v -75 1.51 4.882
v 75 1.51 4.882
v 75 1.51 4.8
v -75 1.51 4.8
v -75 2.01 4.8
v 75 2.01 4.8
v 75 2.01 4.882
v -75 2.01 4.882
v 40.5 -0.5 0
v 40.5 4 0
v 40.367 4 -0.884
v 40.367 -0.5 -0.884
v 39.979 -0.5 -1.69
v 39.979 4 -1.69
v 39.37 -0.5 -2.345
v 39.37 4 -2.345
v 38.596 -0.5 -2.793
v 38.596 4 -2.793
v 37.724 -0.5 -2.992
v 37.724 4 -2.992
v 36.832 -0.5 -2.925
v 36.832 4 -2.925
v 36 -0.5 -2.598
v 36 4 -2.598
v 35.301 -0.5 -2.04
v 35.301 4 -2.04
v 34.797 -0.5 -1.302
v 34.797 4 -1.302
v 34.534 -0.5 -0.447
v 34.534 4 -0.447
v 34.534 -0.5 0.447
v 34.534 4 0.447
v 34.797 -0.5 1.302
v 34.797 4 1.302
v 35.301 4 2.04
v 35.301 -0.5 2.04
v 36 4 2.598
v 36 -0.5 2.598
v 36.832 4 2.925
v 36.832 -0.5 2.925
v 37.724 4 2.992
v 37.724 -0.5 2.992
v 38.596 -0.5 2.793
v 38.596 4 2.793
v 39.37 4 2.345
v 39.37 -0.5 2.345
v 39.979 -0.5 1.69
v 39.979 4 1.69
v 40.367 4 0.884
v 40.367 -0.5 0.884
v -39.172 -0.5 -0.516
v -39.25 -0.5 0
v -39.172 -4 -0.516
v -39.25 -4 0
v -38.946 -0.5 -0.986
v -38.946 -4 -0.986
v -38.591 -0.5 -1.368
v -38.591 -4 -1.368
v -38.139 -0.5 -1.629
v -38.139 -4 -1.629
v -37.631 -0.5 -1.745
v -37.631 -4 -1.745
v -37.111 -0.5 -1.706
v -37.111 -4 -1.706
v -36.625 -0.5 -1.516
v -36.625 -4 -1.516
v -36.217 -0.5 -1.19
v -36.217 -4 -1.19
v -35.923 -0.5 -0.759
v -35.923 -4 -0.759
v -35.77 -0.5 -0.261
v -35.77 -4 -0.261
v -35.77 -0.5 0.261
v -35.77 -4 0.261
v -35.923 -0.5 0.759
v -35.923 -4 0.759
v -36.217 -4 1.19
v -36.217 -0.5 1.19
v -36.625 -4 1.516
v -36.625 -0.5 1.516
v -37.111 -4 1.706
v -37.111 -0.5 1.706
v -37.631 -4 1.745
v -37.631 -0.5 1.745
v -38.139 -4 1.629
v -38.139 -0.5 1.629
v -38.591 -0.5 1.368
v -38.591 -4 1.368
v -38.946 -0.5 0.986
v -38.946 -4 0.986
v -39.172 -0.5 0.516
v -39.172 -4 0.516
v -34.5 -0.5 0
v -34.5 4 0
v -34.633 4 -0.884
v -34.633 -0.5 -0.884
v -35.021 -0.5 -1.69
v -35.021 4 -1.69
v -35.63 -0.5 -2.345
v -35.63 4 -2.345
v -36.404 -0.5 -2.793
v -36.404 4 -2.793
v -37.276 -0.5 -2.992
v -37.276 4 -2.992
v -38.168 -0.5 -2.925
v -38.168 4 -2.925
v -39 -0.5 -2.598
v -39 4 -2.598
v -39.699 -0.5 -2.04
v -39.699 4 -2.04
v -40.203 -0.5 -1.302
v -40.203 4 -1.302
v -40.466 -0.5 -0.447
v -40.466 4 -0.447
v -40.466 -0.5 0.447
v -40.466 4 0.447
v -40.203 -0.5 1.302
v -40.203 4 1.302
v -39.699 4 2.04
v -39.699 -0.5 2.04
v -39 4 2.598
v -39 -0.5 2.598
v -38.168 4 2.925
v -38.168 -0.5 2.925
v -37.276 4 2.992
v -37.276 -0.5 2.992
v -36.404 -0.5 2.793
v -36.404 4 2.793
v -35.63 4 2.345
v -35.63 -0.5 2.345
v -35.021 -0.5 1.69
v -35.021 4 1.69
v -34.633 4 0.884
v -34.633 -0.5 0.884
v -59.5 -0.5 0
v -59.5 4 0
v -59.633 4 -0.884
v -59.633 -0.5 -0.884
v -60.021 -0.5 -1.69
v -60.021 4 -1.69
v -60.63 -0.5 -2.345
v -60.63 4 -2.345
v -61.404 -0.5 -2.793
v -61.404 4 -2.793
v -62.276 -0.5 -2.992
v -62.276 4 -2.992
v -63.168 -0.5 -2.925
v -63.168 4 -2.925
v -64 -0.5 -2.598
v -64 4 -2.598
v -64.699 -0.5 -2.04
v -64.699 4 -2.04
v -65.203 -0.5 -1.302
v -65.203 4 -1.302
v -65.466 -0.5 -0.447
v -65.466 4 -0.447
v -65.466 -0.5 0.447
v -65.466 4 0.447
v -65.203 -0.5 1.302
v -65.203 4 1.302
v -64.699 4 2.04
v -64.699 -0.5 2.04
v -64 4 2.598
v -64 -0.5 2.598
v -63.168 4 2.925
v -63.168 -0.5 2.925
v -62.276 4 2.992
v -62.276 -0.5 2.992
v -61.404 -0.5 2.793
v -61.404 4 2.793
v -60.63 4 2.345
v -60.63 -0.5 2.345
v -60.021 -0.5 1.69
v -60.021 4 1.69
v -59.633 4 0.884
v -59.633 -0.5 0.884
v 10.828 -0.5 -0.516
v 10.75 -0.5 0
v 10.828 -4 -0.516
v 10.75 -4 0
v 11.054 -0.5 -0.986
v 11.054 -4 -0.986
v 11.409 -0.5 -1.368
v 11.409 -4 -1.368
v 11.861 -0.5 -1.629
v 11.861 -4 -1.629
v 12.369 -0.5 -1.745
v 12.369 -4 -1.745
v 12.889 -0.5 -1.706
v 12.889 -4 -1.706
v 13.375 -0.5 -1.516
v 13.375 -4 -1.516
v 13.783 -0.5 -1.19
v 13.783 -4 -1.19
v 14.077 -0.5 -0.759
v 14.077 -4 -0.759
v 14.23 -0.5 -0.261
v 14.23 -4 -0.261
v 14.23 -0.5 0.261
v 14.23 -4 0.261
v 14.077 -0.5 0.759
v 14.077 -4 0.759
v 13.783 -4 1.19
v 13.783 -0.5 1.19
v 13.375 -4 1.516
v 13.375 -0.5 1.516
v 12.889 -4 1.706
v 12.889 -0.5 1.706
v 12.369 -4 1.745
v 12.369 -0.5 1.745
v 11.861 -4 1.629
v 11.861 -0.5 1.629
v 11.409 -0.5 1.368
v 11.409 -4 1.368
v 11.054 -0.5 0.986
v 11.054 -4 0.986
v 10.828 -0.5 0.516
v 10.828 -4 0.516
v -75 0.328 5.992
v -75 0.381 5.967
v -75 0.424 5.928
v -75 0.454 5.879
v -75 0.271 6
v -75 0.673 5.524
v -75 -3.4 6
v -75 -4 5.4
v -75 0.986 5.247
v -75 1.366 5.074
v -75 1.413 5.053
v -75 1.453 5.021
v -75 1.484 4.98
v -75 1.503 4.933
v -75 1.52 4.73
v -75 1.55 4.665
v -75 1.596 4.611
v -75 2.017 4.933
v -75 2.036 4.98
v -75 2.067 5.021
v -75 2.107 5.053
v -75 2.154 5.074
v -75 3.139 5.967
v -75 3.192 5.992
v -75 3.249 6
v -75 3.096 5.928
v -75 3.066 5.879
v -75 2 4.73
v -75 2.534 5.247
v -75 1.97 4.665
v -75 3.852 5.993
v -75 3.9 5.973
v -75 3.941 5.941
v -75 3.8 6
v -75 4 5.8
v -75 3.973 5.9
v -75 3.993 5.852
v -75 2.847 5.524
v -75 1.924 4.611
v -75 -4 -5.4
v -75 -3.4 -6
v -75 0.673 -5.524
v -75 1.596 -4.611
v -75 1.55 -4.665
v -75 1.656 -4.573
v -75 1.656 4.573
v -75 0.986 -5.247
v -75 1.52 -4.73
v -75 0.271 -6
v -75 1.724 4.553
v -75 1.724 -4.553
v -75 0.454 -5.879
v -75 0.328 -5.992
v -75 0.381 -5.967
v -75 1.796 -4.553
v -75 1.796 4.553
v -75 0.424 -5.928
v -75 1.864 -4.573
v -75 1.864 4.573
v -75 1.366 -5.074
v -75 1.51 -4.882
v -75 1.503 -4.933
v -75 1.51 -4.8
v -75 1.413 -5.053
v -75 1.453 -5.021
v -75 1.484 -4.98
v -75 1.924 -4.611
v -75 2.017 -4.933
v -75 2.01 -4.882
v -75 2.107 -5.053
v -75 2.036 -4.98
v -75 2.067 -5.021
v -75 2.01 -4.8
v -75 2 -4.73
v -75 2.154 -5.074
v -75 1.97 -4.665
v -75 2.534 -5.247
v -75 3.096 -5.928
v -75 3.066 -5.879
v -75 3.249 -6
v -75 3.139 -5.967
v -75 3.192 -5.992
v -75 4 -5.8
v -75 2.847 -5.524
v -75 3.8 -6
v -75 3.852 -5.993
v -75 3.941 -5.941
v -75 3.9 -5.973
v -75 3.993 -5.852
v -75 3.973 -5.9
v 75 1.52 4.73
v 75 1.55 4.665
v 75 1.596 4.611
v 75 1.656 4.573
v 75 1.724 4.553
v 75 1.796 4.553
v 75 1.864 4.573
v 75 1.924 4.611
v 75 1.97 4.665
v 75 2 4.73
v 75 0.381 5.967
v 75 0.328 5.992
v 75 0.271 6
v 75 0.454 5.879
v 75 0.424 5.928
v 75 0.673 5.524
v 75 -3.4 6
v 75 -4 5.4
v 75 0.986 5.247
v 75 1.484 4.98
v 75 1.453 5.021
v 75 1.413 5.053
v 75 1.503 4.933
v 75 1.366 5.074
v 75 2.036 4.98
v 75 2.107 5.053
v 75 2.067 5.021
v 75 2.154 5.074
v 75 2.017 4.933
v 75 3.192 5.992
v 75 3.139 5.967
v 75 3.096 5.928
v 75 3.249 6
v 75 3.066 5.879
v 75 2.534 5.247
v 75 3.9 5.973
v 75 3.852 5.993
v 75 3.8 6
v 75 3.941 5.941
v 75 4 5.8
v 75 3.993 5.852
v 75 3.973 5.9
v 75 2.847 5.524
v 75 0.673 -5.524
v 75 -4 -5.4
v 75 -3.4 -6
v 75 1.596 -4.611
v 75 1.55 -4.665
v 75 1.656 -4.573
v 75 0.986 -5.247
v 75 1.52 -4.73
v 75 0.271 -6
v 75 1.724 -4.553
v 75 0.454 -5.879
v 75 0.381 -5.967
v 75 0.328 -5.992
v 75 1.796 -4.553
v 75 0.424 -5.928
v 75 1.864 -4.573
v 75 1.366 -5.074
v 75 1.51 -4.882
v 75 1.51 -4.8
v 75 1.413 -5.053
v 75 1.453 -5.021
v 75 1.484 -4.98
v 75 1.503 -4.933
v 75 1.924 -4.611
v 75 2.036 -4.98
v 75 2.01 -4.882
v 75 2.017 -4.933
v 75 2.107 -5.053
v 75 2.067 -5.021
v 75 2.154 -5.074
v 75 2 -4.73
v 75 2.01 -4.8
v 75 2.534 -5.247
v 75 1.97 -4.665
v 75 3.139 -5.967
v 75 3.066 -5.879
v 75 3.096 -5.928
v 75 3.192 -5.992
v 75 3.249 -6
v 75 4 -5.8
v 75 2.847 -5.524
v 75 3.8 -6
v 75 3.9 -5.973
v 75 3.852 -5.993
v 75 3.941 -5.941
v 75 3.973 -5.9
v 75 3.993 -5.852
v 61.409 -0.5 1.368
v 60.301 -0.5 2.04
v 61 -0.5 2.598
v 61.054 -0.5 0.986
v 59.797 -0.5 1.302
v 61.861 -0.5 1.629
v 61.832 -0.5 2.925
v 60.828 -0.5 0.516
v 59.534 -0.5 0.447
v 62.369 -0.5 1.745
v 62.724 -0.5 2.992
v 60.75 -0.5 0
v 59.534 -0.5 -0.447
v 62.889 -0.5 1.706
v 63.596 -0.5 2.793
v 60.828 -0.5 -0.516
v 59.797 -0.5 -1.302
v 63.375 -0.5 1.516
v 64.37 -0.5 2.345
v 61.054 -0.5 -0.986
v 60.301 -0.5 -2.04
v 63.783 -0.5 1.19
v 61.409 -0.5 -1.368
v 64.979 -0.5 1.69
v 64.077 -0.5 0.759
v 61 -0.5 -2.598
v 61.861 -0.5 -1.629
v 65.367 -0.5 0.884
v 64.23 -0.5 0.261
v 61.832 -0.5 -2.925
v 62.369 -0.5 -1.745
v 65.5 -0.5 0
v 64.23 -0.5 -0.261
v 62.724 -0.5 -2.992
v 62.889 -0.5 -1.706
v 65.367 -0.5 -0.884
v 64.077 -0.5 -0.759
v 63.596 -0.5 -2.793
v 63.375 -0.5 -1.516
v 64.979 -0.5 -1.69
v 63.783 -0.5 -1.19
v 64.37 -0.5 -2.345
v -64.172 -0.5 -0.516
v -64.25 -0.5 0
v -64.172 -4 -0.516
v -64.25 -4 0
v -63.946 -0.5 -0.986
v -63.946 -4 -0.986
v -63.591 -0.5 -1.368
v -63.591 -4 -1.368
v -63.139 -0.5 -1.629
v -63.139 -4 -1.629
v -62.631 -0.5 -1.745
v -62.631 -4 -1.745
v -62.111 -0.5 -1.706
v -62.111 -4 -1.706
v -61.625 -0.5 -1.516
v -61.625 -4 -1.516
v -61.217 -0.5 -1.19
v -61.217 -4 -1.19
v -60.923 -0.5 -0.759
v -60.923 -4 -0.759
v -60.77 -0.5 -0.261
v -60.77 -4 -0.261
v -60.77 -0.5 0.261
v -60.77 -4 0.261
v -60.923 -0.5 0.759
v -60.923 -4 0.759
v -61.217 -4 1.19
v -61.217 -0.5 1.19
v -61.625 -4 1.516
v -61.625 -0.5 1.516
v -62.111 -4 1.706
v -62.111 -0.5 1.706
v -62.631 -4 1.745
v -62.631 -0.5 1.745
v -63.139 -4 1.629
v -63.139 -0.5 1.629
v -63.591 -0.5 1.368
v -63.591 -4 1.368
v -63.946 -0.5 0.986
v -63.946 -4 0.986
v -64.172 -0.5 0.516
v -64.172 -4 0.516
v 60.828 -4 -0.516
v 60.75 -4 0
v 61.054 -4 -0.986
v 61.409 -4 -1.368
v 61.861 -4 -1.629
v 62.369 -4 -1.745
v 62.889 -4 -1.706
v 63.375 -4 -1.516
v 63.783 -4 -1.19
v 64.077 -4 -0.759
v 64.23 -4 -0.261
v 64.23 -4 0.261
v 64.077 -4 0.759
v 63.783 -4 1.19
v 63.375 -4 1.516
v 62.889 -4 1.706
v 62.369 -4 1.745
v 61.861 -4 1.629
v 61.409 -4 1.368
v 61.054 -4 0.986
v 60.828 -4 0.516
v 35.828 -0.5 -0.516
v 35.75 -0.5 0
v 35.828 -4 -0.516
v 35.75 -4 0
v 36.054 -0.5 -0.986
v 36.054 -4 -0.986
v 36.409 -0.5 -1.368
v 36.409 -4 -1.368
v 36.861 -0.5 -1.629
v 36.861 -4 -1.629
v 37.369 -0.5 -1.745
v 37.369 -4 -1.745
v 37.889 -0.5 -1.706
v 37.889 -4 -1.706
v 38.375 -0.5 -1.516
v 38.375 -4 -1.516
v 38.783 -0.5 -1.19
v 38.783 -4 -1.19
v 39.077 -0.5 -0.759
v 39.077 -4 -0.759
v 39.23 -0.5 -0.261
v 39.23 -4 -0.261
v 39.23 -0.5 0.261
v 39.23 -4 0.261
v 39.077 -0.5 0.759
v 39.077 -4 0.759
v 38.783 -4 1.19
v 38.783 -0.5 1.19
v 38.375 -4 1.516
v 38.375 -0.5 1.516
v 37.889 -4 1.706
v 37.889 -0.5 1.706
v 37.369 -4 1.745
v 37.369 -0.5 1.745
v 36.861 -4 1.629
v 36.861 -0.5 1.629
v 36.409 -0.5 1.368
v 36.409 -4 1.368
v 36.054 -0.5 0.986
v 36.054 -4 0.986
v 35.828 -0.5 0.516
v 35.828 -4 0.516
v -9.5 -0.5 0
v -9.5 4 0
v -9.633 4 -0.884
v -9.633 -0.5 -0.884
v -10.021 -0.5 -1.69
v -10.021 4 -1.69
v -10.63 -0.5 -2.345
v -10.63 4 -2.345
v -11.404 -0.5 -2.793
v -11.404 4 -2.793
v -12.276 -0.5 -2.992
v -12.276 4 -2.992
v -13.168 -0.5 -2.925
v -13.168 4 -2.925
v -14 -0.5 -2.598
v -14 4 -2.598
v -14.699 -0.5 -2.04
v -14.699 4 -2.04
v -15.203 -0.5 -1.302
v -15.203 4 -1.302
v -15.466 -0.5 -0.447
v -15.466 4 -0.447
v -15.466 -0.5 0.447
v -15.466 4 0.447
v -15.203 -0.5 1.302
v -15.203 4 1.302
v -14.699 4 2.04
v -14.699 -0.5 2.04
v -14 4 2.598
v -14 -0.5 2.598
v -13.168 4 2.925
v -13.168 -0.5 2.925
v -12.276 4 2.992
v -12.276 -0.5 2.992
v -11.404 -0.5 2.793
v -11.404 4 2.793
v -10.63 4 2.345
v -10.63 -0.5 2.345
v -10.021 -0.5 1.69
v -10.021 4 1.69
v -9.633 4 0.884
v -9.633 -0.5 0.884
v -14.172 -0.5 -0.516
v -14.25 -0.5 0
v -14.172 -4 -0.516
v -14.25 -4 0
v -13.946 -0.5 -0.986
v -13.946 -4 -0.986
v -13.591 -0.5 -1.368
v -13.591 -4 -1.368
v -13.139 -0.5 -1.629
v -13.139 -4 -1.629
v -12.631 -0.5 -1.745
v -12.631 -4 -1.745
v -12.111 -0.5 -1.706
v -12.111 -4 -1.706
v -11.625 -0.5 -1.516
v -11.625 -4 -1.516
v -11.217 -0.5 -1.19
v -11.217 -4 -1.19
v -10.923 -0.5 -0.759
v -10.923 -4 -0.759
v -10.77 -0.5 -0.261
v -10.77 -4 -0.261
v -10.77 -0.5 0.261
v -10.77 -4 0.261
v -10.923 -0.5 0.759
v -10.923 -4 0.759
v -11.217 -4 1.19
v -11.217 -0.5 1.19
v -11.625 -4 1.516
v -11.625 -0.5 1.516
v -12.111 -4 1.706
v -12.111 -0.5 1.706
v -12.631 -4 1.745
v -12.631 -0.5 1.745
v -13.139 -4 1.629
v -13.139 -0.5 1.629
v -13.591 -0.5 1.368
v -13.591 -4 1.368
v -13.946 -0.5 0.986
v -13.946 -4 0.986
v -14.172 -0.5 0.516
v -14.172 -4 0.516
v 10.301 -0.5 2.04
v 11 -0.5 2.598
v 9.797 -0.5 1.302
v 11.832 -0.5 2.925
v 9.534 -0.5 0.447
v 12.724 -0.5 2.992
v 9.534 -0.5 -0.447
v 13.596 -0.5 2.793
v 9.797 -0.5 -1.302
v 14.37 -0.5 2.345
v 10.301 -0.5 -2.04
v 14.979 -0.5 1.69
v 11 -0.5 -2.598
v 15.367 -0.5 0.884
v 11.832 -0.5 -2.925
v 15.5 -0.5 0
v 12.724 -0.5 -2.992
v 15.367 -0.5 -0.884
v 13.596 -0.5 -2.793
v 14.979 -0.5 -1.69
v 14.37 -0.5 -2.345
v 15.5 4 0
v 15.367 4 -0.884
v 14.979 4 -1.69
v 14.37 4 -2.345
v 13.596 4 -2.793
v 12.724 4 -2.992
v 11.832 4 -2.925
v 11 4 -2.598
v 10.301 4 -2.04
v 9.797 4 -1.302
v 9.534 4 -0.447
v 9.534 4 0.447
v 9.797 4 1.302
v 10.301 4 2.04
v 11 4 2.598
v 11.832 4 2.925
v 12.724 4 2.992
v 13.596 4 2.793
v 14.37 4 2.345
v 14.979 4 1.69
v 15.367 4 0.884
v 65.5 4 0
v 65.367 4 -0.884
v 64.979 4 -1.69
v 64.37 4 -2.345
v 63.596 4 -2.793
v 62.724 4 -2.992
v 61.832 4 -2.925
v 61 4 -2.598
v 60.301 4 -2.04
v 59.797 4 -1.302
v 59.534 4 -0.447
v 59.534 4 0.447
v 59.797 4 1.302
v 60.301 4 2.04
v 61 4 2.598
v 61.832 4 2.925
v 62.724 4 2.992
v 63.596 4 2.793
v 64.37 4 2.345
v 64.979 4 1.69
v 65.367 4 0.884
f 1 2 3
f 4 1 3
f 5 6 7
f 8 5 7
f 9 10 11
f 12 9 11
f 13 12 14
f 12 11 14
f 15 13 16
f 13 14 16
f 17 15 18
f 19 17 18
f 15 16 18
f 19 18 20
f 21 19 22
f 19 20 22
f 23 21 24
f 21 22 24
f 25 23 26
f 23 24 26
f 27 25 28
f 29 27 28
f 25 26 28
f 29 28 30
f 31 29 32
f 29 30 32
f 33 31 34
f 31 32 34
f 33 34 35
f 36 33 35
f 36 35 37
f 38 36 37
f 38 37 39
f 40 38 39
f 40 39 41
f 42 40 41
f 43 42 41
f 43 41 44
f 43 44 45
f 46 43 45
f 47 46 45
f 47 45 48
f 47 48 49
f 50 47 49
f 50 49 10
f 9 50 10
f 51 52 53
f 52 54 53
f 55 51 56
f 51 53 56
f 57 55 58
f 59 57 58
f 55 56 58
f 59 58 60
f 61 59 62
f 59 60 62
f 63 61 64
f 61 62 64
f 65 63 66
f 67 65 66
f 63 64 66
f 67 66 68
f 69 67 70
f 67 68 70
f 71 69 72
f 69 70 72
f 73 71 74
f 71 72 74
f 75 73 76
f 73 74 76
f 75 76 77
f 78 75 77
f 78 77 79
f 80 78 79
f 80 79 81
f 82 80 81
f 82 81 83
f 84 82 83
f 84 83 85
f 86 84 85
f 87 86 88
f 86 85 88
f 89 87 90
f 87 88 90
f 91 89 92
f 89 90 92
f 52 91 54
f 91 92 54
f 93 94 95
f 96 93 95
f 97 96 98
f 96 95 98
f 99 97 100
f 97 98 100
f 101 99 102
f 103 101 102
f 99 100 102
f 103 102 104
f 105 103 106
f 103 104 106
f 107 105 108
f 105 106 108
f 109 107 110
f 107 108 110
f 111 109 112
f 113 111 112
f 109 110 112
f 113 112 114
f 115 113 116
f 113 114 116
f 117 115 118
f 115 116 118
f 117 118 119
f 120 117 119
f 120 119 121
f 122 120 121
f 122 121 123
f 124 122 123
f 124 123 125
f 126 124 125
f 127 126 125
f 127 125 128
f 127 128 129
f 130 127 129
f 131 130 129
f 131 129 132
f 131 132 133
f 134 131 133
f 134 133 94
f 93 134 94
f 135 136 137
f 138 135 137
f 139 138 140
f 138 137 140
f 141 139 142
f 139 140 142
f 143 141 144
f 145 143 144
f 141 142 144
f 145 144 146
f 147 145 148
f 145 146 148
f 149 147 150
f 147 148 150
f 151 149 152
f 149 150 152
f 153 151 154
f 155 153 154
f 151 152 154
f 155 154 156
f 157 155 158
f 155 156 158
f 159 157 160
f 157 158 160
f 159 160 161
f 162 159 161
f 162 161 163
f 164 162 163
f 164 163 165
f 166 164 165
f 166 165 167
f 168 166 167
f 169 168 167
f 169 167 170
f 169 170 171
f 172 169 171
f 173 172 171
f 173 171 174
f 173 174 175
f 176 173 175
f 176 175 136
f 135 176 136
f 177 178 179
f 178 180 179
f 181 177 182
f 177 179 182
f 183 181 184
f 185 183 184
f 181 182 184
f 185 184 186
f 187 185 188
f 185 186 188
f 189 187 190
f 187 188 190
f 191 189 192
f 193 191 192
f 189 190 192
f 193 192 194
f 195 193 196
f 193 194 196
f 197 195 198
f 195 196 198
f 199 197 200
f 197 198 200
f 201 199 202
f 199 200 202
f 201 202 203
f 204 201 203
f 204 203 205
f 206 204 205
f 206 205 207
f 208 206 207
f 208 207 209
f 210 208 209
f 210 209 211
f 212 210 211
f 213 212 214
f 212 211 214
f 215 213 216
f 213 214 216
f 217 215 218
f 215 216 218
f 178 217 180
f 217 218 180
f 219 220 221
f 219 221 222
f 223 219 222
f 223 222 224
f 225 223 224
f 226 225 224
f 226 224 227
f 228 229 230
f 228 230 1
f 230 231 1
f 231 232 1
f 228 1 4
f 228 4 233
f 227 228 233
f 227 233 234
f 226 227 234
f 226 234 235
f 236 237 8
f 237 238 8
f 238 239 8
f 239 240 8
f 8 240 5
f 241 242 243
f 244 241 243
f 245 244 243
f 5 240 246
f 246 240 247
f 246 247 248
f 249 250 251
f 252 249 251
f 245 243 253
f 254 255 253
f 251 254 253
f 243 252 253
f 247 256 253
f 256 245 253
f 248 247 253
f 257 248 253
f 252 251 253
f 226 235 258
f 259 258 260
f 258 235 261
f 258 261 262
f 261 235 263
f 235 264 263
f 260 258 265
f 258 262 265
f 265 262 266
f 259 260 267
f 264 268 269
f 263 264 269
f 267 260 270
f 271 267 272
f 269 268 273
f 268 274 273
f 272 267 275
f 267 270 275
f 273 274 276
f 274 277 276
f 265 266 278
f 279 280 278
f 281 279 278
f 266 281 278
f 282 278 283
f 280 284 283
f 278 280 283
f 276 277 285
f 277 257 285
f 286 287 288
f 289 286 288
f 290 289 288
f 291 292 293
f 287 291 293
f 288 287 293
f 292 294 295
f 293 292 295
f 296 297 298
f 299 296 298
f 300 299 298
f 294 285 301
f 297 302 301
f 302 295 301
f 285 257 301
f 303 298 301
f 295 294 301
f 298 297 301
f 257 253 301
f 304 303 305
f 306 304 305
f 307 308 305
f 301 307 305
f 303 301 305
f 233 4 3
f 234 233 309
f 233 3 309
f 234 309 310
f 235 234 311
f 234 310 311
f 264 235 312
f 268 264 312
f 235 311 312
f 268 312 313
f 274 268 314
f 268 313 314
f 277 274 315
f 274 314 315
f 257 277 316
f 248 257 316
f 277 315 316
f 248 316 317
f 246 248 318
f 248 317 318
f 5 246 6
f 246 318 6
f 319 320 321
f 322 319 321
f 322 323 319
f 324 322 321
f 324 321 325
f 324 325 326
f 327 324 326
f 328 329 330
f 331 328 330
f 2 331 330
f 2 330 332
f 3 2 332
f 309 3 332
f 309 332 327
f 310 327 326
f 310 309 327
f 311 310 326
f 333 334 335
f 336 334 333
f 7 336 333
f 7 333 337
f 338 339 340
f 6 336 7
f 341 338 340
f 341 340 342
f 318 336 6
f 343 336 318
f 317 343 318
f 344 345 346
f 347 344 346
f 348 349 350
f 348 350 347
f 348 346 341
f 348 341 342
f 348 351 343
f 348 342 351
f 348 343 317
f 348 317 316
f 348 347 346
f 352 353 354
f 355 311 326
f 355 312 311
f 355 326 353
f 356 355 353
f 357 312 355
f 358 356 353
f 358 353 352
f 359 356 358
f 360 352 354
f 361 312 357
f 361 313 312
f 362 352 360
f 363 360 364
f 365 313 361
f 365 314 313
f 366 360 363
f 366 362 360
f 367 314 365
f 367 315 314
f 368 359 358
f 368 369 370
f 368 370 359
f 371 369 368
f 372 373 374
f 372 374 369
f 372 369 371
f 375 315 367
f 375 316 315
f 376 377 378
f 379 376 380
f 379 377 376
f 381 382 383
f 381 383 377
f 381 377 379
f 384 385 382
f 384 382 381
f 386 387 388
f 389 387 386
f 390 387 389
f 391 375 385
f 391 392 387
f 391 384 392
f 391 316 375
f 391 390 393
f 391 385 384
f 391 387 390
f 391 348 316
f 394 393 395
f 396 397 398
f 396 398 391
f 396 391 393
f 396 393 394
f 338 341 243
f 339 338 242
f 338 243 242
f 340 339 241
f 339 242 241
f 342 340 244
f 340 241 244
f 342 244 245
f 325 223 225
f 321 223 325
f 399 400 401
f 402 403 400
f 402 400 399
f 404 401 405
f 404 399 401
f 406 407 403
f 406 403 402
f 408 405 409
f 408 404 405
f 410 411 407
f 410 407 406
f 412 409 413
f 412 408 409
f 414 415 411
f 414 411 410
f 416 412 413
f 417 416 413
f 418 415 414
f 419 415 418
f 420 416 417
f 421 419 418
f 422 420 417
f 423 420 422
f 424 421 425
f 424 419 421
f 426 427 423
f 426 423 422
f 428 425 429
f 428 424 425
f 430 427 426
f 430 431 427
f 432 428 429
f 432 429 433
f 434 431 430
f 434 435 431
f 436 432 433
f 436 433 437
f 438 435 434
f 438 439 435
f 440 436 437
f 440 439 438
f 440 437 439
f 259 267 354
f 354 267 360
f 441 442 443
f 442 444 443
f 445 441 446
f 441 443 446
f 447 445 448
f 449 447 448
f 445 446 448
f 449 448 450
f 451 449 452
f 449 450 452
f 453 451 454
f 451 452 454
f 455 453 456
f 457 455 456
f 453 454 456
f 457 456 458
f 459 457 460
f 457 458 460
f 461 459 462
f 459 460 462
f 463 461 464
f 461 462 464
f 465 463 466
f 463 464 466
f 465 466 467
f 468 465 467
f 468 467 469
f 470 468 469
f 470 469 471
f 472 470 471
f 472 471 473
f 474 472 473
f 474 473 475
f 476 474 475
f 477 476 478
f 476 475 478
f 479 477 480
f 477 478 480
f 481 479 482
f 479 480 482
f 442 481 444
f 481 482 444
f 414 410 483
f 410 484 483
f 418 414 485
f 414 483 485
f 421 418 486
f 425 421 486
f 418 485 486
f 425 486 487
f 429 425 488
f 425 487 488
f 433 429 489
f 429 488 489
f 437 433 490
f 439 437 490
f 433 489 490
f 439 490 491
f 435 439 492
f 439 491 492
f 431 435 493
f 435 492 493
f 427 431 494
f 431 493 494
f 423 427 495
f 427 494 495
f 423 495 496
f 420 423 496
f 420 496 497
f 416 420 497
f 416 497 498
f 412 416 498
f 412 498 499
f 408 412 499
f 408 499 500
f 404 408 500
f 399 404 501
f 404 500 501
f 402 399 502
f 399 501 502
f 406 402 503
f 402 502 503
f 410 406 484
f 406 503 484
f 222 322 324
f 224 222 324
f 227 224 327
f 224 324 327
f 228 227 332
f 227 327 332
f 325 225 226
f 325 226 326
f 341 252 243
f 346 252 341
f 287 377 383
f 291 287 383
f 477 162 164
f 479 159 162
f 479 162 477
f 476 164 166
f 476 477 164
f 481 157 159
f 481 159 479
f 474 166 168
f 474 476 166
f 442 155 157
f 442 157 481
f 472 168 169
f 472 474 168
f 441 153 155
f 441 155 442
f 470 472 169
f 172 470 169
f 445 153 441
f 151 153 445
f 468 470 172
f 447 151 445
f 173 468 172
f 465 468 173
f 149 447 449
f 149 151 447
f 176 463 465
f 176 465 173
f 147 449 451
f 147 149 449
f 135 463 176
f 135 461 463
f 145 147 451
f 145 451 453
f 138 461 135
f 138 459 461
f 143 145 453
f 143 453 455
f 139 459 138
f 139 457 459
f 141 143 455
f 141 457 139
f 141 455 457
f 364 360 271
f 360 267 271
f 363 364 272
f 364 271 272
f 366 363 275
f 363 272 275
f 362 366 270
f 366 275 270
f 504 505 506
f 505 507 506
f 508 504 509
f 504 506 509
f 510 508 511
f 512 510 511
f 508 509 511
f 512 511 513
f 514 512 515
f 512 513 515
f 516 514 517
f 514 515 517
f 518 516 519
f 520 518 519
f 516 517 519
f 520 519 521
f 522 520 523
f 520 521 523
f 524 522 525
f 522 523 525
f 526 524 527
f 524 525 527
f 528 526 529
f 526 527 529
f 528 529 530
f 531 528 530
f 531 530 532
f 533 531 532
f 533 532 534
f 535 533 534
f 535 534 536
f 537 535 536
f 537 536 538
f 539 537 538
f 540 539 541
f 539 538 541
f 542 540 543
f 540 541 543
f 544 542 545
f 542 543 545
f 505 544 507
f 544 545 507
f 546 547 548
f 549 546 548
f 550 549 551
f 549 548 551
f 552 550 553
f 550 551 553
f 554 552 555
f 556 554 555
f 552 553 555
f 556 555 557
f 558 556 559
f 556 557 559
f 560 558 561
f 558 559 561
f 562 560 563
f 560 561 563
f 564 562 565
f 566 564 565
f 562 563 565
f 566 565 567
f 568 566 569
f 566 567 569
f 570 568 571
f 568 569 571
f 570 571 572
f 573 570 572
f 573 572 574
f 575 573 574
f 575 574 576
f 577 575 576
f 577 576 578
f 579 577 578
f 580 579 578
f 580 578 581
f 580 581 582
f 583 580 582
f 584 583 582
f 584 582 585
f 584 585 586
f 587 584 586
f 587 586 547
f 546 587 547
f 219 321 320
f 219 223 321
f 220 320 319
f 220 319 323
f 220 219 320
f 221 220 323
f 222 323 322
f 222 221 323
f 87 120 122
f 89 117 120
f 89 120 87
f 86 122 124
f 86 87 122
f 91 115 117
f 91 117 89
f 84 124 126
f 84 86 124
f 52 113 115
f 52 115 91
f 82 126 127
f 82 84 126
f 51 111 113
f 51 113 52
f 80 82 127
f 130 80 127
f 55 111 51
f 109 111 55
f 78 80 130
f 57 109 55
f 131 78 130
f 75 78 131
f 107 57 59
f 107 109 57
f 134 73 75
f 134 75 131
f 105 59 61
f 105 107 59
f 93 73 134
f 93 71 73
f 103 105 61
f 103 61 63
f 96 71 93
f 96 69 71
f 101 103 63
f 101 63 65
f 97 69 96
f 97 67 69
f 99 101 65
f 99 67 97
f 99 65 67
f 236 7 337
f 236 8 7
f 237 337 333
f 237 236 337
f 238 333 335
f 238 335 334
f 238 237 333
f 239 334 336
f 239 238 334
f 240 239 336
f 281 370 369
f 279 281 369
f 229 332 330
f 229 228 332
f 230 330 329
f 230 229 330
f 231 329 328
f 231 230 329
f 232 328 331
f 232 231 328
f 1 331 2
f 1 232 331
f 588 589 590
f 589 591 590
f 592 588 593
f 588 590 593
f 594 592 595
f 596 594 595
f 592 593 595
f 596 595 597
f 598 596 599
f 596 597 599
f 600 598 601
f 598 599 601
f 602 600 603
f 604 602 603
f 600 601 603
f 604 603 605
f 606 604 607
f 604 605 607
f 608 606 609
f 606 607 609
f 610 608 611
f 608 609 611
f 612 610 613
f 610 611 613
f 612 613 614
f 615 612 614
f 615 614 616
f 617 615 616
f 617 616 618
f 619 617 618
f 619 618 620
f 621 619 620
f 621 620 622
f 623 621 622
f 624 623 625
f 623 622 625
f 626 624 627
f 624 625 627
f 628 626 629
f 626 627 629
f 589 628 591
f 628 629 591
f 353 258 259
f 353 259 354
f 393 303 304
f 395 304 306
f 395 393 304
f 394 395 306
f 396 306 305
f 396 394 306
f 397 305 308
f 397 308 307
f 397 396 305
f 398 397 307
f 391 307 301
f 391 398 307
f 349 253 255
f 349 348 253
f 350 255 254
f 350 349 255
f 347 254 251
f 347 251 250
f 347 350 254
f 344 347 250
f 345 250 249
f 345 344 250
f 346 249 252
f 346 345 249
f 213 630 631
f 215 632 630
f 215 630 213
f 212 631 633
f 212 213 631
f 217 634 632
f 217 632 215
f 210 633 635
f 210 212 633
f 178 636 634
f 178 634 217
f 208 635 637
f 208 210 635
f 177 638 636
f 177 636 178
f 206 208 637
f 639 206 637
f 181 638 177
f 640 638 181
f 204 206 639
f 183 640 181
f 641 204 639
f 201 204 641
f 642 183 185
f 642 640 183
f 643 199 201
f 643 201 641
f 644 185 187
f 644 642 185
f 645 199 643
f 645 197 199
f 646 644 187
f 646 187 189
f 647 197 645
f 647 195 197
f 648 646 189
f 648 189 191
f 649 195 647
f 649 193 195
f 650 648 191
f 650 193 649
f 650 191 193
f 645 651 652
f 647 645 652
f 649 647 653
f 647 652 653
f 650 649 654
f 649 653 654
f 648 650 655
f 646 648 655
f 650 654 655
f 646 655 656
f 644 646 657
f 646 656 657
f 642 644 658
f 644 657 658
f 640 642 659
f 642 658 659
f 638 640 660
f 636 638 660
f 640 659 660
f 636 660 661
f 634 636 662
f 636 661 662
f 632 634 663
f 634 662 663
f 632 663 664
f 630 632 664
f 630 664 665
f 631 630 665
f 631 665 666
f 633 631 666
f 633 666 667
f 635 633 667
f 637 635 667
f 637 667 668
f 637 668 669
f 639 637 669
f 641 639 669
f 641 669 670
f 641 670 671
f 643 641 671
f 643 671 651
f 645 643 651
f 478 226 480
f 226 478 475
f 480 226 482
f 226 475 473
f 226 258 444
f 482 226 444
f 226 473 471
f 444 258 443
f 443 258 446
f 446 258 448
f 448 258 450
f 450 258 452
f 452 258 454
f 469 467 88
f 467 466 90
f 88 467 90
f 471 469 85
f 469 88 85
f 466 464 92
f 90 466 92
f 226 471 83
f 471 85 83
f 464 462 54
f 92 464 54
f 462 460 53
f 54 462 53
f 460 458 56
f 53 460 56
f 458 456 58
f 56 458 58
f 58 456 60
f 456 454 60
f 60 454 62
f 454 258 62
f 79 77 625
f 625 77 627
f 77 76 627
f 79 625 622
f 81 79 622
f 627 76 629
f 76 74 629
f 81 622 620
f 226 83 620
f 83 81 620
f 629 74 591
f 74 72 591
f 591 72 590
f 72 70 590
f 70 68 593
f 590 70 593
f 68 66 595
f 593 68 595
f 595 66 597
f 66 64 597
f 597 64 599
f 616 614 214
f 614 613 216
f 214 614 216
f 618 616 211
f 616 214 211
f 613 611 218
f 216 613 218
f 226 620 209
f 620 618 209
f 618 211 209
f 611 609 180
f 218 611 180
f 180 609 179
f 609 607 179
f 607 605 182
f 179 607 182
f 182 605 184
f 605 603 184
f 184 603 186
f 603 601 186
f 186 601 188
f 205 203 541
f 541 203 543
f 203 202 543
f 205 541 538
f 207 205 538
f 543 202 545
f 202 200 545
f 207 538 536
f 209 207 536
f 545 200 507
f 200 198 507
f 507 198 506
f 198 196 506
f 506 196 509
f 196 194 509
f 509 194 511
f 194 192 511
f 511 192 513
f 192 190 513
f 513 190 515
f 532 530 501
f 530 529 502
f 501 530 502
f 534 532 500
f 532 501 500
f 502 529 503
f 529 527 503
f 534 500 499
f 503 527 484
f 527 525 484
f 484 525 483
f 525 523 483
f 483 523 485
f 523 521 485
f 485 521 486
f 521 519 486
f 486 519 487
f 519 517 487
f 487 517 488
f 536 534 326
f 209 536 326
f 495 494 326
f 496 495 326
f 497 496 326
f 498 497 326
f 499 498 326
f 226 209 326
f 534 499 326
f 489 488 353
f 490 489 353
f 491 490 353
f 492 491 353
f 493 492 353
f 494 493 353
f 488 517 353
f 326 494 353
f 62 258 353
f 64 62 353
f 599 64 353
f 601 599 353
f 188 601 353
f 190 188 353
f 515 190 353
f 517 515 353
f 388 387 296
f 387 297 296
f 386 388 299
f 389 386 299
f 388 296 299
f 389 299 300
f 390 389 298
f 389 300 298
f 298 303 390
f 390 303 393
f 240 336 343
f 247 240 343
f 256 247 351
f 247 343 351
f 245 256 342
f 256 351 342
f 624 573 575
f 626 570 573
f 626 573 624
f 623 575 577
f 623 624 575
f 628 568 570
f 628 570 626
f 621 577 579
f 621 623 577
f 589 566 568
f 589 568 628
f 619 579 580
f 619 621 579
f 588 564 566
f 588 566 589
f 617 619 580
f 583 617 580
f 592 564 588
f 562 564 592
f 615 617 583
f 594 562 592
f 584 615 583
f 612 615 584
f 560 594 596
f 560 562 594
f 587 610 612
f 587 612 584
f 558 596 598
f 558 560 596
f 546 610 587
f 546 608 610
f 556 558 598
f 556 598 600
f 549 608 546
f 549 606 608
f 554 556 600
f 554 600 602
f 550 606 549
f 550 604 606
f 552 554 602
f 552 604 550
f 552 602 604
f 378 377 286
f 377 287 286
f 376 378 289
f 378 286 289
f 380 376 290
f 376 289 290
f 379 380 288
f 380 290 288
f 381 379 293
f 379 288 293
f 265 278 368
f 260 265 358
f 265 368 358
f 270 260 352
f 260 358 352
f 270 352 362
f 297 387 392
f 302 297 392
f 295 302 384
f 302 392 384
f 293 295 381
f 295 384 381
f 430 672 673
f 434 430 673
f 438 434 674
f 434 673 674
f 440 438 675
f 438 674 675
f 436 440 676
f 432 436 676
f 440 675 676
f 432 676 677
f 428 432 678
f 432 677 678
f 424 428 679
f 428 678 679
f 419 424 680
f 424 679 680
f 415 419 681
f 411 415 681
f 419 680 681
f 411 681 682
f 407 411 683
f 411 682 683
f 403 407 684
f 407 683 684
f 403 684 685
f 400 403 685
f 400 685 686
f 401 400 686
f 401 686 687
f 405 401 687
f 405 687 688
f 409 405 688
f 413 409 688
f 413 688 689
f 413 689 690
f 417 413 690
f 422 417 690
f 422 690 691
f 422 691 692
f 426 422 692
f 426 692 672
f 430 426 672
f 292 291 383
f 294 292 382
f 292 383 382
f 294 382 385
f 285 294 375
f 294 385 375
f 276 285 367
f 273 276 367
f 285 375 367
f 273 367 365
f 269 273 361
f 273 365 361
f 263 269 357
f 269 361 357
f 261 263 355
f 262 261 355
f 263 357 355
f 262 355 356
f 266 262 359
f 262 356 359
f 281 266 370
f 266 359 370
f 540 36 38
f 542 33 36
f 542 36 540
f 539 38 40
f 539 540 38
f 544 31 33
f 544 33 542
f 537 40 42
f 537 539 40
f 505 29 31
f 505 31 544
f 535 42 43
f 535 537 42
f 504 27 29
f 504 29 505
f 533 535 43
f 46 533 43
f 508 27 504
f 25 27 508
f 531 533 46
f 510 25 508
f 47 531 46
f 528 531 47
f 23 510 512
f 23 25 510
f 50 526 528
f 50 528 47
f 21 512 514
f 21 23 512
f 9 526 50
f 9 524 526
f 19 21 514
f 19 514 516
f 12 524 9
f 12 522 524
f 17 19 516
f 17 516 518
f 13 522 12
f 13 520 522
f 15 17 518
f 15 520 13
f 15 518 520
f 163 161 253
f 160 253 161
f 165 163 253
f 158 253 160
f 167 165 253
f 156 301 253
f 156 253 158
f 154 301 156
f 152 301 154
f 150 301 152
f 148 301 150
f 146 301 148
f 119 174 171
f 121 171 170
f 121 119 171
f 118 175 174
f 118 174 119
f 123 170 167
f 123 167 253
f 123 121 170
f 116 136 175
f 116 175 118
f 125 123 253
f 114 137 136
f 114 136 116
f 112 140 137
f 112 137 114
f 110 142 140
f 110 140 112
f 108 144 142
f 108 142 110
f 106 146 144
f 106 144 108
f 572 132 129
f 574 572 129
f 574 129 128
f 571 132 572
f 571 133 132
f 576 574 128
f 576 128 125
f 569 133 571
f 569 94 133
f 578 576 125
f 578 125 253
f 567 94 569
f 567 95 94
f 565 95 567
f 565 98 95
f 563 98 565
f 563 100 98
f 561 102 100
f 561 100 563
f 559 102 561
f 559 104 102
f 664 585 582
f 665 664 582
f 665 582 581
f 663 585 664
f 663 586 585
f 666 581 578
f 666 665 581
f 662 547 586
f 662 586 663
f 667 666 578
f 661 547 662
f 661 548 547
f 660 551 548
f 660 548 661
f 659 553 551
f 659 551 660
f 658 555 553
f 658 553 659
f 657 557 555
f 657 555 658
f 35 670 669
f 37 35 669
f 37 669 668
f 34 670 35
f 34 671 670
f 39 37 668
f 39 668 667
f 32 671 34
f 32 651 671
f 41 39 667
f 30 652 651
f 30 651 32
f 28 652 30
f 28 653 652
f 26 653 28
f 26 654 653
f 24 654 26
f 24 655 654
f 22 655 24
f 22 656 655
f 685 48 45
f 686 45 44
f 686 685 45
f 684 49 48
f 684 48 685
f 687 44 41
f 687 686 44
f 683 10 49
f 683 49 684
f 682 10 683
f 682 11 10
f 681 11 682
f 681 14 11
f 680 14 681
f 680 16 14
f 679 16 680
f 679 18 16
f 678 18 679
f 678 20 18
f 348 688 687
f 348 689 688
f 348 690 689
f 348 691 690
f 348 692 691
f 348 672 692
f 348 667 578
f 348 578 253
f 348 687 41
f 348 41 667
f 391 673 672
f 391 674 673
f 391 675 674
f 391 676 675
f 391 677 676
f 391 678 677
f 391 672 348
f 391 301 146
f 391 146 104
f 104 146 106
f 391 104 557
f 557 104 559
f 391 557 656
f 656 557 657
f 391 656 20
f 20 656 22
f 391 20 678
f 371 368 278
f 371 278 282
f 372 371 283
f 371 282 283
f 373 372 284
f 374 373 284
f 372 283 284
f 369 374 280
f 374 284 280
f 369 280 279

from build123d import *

# Parameters (mm, degrees)
SKETCH_1_W                   = 150
SKETCH_1_H                   = 12
EXTRUDE_1_DEPTH              = 8
CUT_EXTRUDE_1_DEPTH          = 151.173233301
CUT_EXTRUDE_2_DEPTH          = 151.173233301
CUT_EXTRUDE_3_DEPTH          = 151.173233301
CUT_EXTRUDE_4_DEPTH          = 151.173233301
CUT_EXTRUDE_5_DEPTH          = 151.173233301
CUT_EXTRUDE_6_DEPTH          = 151.173233301
HOLE_WIZARD_M3_1_D           = 3.5
HOLE_WIZARD_M3_1_CBORE_D     = 5.9999
HOLE_WIZARD_M3_1_CBORE_DEPTH = 4.5
CHAMFER_1_SIZE               = 0.6
FILLET_1_R                   = 0.2


with BuildPart() as part:
    # 草图1 → 凸台-拉伸1 (new body)
    with BuildSketch(Plane(origin=(0, 4, 0), x_dir=(1, 0, 0), z_dir=(0, 1, 0))):
        Rectangle(SKETCH_1_W, SKETCH_1_H)
    extrude(amount=-EXTRUDE_1_DEPTH)

    # 草图2 → 切除-拉伸1 (cut, through all)
    with BuildSketch(Plane(origin=(75, 0, 0), x_dir=(0, 0, -1), z_dir=(1, 0, 0))):
        with BuildLine():
            Line((6, 1.51), (6, 2.01))
            Line((6, 2.01), (4.8, 2.01))
            ThreePointArc((4.8, 2.01), (4.55, 1.76), (4.8, 1.51))
            Line((4.8, 1.51), (6, 1.51))
        make_face()
    extrude(amount=-CUT_EXTRUDE_1_DEPTH, mode=Mode.SUBTRACT)

    # 草图3 → 切除-拉伸2 (cut, through all)
    with BuildSketch(Plane(origin=(75, 0, 0), x_dir=(0, 0, -1), z_dir=(1, 0, 0))):
        with BuildLine():
            Line((6, 2.01), (6, 3.111111))
            ThreePointArc((6, 3.111111), (5.367595703, 2.693428684), (5.04, 2.01))
            Line((5.04, 2.01), (6, 2.01))
        make_face()
    extrude(amount=-CUT_EXTRUDE_2_DEPTH, mode=Mode.SUBTRACT)

    # 草图4 → 切除-拉伸3 (cut, through all)
    with BuildSketch(Plane(origin=(75, 0, 0), x_dir=(0, 0, -1), z_dir=(1, 0, 0))):
        with BuildLine():
            Line((6, 1.51), (5.04, 1.51))
            ThreePointArc((5.04, 1.51), (5.367595703, 0.826571316), (6, 0.408889))
            Line((6, 0.408889), (6, 1.51))
        make_face()
    extrude(amount=-CUT_EXTRUDE_3_DEPTH, mode=Mode.SUBTRACT)

    # 草图5 → 切除-拉伸4 (cut, through all)
    with BuildSketch(Plane(origin=(75, 0, 0), x_dir=(0, 0, -1), z_dir=(1, 0, 0))):
        with BuildLine():
            Line((-6, 2.01), (-6, 1.51))
            Line((-6, 1.51), (-4.8, 1.51))
            ThreePointArc((-4.8, 1.51), (-4.55, 1.76), (-4.8, 2.01))
            Line((-4.8, 2.01), (-6, 2.01))
        make_face()
    extrude(amount=-CUT_EXTRUDE_4_DEPTH, mode=Mode.SUBTRACT)

    # 草图6 → 切除-拉伸5 (cut, through all)
    with BuildSketch(Plane(origin=(75, 0, 0), x_dir=(0, 0, -1), z_dir=(1, 0, 0))):
        with BuildLine():
            Line((-6, 1.51), (-6, 0.408889))
            ThreePointArc((-6, 0.408889), (-5.367595703, 0.826571316), (-5.04, 1.51))
            Line((-5.04, 1.51), (-6, 1.51))
        make_face()
    extrude(amount=-CUT_EXTRUDE_5_DEPTH, mode=Mode.SUBTRACT)

    # 草图7 → 切除-拉伸6 (cut, through all)
    with BuildSketch(Plane(origin=(75, 0, 0), x_dir=(0, 0, -1), z_dir=(1, 0, 0))):
        with BuildLine():
            Line((-6, 2.01), (-5.04, 2.01))
            ThreePointArc((-5.04, 2.01), (-5.367595703, 2.693428684), (-6, 3.111111))
            Line((-6, 3.111111), (-6, 2.01))
        make_face()
    extrude(amount=-CUT_EXTRUDE_6_DEPTH, mode=Mode.SUBTRACT)

    # M3 六角头机械螺钉的柱形沉头孔1 (through all)
    with Locations(Plane(origin=(0, 4, 0), x_dir=(1, 0, 0), z_dir=(0, 1, 0))):
        with Locations((-62.5, 0), (-37.5, 0), (-12.5, 0), (12.5, 0), (37.5, 0), (62.5, 0)):
            CounterBoreHole(HOLE_WIZARD_M3_1_D / 2, HOLE_WIZARD_M3_1_CBORE_D / 2, HOLE_WIZARD_M3_1_CBORE_DEPTH)

    # 倒角1
    chamfer_1_edges = [part.edges().sort_by_distance(p)[0] for p in [
        (0, -4, -6),
        (0, -4, 6),
    ]]
    chamfer(chamfer_1_edges, length=CHAMFER_1_SIZE)

    # 圆角1
    fillet_1_edges = [part.edges().sort_by_distance(p)[0] for p in [
        (0, 2.01, -5.04),
        (0, 3.111111, -6),
        (0, 0.408889, -6),
        (0, 1.51, -5.04),
        (0, 4, -6),
        (0, 4, 6),
        (0, 1.51, 5.04),
        (0, 0.408889, 6),
        (0, 3.111111, 6),
        (0, 2.01, 5.04),
    ]]
    fillet(fillet_1_edges, radius=FILLET_1_R)


solid = part.part
